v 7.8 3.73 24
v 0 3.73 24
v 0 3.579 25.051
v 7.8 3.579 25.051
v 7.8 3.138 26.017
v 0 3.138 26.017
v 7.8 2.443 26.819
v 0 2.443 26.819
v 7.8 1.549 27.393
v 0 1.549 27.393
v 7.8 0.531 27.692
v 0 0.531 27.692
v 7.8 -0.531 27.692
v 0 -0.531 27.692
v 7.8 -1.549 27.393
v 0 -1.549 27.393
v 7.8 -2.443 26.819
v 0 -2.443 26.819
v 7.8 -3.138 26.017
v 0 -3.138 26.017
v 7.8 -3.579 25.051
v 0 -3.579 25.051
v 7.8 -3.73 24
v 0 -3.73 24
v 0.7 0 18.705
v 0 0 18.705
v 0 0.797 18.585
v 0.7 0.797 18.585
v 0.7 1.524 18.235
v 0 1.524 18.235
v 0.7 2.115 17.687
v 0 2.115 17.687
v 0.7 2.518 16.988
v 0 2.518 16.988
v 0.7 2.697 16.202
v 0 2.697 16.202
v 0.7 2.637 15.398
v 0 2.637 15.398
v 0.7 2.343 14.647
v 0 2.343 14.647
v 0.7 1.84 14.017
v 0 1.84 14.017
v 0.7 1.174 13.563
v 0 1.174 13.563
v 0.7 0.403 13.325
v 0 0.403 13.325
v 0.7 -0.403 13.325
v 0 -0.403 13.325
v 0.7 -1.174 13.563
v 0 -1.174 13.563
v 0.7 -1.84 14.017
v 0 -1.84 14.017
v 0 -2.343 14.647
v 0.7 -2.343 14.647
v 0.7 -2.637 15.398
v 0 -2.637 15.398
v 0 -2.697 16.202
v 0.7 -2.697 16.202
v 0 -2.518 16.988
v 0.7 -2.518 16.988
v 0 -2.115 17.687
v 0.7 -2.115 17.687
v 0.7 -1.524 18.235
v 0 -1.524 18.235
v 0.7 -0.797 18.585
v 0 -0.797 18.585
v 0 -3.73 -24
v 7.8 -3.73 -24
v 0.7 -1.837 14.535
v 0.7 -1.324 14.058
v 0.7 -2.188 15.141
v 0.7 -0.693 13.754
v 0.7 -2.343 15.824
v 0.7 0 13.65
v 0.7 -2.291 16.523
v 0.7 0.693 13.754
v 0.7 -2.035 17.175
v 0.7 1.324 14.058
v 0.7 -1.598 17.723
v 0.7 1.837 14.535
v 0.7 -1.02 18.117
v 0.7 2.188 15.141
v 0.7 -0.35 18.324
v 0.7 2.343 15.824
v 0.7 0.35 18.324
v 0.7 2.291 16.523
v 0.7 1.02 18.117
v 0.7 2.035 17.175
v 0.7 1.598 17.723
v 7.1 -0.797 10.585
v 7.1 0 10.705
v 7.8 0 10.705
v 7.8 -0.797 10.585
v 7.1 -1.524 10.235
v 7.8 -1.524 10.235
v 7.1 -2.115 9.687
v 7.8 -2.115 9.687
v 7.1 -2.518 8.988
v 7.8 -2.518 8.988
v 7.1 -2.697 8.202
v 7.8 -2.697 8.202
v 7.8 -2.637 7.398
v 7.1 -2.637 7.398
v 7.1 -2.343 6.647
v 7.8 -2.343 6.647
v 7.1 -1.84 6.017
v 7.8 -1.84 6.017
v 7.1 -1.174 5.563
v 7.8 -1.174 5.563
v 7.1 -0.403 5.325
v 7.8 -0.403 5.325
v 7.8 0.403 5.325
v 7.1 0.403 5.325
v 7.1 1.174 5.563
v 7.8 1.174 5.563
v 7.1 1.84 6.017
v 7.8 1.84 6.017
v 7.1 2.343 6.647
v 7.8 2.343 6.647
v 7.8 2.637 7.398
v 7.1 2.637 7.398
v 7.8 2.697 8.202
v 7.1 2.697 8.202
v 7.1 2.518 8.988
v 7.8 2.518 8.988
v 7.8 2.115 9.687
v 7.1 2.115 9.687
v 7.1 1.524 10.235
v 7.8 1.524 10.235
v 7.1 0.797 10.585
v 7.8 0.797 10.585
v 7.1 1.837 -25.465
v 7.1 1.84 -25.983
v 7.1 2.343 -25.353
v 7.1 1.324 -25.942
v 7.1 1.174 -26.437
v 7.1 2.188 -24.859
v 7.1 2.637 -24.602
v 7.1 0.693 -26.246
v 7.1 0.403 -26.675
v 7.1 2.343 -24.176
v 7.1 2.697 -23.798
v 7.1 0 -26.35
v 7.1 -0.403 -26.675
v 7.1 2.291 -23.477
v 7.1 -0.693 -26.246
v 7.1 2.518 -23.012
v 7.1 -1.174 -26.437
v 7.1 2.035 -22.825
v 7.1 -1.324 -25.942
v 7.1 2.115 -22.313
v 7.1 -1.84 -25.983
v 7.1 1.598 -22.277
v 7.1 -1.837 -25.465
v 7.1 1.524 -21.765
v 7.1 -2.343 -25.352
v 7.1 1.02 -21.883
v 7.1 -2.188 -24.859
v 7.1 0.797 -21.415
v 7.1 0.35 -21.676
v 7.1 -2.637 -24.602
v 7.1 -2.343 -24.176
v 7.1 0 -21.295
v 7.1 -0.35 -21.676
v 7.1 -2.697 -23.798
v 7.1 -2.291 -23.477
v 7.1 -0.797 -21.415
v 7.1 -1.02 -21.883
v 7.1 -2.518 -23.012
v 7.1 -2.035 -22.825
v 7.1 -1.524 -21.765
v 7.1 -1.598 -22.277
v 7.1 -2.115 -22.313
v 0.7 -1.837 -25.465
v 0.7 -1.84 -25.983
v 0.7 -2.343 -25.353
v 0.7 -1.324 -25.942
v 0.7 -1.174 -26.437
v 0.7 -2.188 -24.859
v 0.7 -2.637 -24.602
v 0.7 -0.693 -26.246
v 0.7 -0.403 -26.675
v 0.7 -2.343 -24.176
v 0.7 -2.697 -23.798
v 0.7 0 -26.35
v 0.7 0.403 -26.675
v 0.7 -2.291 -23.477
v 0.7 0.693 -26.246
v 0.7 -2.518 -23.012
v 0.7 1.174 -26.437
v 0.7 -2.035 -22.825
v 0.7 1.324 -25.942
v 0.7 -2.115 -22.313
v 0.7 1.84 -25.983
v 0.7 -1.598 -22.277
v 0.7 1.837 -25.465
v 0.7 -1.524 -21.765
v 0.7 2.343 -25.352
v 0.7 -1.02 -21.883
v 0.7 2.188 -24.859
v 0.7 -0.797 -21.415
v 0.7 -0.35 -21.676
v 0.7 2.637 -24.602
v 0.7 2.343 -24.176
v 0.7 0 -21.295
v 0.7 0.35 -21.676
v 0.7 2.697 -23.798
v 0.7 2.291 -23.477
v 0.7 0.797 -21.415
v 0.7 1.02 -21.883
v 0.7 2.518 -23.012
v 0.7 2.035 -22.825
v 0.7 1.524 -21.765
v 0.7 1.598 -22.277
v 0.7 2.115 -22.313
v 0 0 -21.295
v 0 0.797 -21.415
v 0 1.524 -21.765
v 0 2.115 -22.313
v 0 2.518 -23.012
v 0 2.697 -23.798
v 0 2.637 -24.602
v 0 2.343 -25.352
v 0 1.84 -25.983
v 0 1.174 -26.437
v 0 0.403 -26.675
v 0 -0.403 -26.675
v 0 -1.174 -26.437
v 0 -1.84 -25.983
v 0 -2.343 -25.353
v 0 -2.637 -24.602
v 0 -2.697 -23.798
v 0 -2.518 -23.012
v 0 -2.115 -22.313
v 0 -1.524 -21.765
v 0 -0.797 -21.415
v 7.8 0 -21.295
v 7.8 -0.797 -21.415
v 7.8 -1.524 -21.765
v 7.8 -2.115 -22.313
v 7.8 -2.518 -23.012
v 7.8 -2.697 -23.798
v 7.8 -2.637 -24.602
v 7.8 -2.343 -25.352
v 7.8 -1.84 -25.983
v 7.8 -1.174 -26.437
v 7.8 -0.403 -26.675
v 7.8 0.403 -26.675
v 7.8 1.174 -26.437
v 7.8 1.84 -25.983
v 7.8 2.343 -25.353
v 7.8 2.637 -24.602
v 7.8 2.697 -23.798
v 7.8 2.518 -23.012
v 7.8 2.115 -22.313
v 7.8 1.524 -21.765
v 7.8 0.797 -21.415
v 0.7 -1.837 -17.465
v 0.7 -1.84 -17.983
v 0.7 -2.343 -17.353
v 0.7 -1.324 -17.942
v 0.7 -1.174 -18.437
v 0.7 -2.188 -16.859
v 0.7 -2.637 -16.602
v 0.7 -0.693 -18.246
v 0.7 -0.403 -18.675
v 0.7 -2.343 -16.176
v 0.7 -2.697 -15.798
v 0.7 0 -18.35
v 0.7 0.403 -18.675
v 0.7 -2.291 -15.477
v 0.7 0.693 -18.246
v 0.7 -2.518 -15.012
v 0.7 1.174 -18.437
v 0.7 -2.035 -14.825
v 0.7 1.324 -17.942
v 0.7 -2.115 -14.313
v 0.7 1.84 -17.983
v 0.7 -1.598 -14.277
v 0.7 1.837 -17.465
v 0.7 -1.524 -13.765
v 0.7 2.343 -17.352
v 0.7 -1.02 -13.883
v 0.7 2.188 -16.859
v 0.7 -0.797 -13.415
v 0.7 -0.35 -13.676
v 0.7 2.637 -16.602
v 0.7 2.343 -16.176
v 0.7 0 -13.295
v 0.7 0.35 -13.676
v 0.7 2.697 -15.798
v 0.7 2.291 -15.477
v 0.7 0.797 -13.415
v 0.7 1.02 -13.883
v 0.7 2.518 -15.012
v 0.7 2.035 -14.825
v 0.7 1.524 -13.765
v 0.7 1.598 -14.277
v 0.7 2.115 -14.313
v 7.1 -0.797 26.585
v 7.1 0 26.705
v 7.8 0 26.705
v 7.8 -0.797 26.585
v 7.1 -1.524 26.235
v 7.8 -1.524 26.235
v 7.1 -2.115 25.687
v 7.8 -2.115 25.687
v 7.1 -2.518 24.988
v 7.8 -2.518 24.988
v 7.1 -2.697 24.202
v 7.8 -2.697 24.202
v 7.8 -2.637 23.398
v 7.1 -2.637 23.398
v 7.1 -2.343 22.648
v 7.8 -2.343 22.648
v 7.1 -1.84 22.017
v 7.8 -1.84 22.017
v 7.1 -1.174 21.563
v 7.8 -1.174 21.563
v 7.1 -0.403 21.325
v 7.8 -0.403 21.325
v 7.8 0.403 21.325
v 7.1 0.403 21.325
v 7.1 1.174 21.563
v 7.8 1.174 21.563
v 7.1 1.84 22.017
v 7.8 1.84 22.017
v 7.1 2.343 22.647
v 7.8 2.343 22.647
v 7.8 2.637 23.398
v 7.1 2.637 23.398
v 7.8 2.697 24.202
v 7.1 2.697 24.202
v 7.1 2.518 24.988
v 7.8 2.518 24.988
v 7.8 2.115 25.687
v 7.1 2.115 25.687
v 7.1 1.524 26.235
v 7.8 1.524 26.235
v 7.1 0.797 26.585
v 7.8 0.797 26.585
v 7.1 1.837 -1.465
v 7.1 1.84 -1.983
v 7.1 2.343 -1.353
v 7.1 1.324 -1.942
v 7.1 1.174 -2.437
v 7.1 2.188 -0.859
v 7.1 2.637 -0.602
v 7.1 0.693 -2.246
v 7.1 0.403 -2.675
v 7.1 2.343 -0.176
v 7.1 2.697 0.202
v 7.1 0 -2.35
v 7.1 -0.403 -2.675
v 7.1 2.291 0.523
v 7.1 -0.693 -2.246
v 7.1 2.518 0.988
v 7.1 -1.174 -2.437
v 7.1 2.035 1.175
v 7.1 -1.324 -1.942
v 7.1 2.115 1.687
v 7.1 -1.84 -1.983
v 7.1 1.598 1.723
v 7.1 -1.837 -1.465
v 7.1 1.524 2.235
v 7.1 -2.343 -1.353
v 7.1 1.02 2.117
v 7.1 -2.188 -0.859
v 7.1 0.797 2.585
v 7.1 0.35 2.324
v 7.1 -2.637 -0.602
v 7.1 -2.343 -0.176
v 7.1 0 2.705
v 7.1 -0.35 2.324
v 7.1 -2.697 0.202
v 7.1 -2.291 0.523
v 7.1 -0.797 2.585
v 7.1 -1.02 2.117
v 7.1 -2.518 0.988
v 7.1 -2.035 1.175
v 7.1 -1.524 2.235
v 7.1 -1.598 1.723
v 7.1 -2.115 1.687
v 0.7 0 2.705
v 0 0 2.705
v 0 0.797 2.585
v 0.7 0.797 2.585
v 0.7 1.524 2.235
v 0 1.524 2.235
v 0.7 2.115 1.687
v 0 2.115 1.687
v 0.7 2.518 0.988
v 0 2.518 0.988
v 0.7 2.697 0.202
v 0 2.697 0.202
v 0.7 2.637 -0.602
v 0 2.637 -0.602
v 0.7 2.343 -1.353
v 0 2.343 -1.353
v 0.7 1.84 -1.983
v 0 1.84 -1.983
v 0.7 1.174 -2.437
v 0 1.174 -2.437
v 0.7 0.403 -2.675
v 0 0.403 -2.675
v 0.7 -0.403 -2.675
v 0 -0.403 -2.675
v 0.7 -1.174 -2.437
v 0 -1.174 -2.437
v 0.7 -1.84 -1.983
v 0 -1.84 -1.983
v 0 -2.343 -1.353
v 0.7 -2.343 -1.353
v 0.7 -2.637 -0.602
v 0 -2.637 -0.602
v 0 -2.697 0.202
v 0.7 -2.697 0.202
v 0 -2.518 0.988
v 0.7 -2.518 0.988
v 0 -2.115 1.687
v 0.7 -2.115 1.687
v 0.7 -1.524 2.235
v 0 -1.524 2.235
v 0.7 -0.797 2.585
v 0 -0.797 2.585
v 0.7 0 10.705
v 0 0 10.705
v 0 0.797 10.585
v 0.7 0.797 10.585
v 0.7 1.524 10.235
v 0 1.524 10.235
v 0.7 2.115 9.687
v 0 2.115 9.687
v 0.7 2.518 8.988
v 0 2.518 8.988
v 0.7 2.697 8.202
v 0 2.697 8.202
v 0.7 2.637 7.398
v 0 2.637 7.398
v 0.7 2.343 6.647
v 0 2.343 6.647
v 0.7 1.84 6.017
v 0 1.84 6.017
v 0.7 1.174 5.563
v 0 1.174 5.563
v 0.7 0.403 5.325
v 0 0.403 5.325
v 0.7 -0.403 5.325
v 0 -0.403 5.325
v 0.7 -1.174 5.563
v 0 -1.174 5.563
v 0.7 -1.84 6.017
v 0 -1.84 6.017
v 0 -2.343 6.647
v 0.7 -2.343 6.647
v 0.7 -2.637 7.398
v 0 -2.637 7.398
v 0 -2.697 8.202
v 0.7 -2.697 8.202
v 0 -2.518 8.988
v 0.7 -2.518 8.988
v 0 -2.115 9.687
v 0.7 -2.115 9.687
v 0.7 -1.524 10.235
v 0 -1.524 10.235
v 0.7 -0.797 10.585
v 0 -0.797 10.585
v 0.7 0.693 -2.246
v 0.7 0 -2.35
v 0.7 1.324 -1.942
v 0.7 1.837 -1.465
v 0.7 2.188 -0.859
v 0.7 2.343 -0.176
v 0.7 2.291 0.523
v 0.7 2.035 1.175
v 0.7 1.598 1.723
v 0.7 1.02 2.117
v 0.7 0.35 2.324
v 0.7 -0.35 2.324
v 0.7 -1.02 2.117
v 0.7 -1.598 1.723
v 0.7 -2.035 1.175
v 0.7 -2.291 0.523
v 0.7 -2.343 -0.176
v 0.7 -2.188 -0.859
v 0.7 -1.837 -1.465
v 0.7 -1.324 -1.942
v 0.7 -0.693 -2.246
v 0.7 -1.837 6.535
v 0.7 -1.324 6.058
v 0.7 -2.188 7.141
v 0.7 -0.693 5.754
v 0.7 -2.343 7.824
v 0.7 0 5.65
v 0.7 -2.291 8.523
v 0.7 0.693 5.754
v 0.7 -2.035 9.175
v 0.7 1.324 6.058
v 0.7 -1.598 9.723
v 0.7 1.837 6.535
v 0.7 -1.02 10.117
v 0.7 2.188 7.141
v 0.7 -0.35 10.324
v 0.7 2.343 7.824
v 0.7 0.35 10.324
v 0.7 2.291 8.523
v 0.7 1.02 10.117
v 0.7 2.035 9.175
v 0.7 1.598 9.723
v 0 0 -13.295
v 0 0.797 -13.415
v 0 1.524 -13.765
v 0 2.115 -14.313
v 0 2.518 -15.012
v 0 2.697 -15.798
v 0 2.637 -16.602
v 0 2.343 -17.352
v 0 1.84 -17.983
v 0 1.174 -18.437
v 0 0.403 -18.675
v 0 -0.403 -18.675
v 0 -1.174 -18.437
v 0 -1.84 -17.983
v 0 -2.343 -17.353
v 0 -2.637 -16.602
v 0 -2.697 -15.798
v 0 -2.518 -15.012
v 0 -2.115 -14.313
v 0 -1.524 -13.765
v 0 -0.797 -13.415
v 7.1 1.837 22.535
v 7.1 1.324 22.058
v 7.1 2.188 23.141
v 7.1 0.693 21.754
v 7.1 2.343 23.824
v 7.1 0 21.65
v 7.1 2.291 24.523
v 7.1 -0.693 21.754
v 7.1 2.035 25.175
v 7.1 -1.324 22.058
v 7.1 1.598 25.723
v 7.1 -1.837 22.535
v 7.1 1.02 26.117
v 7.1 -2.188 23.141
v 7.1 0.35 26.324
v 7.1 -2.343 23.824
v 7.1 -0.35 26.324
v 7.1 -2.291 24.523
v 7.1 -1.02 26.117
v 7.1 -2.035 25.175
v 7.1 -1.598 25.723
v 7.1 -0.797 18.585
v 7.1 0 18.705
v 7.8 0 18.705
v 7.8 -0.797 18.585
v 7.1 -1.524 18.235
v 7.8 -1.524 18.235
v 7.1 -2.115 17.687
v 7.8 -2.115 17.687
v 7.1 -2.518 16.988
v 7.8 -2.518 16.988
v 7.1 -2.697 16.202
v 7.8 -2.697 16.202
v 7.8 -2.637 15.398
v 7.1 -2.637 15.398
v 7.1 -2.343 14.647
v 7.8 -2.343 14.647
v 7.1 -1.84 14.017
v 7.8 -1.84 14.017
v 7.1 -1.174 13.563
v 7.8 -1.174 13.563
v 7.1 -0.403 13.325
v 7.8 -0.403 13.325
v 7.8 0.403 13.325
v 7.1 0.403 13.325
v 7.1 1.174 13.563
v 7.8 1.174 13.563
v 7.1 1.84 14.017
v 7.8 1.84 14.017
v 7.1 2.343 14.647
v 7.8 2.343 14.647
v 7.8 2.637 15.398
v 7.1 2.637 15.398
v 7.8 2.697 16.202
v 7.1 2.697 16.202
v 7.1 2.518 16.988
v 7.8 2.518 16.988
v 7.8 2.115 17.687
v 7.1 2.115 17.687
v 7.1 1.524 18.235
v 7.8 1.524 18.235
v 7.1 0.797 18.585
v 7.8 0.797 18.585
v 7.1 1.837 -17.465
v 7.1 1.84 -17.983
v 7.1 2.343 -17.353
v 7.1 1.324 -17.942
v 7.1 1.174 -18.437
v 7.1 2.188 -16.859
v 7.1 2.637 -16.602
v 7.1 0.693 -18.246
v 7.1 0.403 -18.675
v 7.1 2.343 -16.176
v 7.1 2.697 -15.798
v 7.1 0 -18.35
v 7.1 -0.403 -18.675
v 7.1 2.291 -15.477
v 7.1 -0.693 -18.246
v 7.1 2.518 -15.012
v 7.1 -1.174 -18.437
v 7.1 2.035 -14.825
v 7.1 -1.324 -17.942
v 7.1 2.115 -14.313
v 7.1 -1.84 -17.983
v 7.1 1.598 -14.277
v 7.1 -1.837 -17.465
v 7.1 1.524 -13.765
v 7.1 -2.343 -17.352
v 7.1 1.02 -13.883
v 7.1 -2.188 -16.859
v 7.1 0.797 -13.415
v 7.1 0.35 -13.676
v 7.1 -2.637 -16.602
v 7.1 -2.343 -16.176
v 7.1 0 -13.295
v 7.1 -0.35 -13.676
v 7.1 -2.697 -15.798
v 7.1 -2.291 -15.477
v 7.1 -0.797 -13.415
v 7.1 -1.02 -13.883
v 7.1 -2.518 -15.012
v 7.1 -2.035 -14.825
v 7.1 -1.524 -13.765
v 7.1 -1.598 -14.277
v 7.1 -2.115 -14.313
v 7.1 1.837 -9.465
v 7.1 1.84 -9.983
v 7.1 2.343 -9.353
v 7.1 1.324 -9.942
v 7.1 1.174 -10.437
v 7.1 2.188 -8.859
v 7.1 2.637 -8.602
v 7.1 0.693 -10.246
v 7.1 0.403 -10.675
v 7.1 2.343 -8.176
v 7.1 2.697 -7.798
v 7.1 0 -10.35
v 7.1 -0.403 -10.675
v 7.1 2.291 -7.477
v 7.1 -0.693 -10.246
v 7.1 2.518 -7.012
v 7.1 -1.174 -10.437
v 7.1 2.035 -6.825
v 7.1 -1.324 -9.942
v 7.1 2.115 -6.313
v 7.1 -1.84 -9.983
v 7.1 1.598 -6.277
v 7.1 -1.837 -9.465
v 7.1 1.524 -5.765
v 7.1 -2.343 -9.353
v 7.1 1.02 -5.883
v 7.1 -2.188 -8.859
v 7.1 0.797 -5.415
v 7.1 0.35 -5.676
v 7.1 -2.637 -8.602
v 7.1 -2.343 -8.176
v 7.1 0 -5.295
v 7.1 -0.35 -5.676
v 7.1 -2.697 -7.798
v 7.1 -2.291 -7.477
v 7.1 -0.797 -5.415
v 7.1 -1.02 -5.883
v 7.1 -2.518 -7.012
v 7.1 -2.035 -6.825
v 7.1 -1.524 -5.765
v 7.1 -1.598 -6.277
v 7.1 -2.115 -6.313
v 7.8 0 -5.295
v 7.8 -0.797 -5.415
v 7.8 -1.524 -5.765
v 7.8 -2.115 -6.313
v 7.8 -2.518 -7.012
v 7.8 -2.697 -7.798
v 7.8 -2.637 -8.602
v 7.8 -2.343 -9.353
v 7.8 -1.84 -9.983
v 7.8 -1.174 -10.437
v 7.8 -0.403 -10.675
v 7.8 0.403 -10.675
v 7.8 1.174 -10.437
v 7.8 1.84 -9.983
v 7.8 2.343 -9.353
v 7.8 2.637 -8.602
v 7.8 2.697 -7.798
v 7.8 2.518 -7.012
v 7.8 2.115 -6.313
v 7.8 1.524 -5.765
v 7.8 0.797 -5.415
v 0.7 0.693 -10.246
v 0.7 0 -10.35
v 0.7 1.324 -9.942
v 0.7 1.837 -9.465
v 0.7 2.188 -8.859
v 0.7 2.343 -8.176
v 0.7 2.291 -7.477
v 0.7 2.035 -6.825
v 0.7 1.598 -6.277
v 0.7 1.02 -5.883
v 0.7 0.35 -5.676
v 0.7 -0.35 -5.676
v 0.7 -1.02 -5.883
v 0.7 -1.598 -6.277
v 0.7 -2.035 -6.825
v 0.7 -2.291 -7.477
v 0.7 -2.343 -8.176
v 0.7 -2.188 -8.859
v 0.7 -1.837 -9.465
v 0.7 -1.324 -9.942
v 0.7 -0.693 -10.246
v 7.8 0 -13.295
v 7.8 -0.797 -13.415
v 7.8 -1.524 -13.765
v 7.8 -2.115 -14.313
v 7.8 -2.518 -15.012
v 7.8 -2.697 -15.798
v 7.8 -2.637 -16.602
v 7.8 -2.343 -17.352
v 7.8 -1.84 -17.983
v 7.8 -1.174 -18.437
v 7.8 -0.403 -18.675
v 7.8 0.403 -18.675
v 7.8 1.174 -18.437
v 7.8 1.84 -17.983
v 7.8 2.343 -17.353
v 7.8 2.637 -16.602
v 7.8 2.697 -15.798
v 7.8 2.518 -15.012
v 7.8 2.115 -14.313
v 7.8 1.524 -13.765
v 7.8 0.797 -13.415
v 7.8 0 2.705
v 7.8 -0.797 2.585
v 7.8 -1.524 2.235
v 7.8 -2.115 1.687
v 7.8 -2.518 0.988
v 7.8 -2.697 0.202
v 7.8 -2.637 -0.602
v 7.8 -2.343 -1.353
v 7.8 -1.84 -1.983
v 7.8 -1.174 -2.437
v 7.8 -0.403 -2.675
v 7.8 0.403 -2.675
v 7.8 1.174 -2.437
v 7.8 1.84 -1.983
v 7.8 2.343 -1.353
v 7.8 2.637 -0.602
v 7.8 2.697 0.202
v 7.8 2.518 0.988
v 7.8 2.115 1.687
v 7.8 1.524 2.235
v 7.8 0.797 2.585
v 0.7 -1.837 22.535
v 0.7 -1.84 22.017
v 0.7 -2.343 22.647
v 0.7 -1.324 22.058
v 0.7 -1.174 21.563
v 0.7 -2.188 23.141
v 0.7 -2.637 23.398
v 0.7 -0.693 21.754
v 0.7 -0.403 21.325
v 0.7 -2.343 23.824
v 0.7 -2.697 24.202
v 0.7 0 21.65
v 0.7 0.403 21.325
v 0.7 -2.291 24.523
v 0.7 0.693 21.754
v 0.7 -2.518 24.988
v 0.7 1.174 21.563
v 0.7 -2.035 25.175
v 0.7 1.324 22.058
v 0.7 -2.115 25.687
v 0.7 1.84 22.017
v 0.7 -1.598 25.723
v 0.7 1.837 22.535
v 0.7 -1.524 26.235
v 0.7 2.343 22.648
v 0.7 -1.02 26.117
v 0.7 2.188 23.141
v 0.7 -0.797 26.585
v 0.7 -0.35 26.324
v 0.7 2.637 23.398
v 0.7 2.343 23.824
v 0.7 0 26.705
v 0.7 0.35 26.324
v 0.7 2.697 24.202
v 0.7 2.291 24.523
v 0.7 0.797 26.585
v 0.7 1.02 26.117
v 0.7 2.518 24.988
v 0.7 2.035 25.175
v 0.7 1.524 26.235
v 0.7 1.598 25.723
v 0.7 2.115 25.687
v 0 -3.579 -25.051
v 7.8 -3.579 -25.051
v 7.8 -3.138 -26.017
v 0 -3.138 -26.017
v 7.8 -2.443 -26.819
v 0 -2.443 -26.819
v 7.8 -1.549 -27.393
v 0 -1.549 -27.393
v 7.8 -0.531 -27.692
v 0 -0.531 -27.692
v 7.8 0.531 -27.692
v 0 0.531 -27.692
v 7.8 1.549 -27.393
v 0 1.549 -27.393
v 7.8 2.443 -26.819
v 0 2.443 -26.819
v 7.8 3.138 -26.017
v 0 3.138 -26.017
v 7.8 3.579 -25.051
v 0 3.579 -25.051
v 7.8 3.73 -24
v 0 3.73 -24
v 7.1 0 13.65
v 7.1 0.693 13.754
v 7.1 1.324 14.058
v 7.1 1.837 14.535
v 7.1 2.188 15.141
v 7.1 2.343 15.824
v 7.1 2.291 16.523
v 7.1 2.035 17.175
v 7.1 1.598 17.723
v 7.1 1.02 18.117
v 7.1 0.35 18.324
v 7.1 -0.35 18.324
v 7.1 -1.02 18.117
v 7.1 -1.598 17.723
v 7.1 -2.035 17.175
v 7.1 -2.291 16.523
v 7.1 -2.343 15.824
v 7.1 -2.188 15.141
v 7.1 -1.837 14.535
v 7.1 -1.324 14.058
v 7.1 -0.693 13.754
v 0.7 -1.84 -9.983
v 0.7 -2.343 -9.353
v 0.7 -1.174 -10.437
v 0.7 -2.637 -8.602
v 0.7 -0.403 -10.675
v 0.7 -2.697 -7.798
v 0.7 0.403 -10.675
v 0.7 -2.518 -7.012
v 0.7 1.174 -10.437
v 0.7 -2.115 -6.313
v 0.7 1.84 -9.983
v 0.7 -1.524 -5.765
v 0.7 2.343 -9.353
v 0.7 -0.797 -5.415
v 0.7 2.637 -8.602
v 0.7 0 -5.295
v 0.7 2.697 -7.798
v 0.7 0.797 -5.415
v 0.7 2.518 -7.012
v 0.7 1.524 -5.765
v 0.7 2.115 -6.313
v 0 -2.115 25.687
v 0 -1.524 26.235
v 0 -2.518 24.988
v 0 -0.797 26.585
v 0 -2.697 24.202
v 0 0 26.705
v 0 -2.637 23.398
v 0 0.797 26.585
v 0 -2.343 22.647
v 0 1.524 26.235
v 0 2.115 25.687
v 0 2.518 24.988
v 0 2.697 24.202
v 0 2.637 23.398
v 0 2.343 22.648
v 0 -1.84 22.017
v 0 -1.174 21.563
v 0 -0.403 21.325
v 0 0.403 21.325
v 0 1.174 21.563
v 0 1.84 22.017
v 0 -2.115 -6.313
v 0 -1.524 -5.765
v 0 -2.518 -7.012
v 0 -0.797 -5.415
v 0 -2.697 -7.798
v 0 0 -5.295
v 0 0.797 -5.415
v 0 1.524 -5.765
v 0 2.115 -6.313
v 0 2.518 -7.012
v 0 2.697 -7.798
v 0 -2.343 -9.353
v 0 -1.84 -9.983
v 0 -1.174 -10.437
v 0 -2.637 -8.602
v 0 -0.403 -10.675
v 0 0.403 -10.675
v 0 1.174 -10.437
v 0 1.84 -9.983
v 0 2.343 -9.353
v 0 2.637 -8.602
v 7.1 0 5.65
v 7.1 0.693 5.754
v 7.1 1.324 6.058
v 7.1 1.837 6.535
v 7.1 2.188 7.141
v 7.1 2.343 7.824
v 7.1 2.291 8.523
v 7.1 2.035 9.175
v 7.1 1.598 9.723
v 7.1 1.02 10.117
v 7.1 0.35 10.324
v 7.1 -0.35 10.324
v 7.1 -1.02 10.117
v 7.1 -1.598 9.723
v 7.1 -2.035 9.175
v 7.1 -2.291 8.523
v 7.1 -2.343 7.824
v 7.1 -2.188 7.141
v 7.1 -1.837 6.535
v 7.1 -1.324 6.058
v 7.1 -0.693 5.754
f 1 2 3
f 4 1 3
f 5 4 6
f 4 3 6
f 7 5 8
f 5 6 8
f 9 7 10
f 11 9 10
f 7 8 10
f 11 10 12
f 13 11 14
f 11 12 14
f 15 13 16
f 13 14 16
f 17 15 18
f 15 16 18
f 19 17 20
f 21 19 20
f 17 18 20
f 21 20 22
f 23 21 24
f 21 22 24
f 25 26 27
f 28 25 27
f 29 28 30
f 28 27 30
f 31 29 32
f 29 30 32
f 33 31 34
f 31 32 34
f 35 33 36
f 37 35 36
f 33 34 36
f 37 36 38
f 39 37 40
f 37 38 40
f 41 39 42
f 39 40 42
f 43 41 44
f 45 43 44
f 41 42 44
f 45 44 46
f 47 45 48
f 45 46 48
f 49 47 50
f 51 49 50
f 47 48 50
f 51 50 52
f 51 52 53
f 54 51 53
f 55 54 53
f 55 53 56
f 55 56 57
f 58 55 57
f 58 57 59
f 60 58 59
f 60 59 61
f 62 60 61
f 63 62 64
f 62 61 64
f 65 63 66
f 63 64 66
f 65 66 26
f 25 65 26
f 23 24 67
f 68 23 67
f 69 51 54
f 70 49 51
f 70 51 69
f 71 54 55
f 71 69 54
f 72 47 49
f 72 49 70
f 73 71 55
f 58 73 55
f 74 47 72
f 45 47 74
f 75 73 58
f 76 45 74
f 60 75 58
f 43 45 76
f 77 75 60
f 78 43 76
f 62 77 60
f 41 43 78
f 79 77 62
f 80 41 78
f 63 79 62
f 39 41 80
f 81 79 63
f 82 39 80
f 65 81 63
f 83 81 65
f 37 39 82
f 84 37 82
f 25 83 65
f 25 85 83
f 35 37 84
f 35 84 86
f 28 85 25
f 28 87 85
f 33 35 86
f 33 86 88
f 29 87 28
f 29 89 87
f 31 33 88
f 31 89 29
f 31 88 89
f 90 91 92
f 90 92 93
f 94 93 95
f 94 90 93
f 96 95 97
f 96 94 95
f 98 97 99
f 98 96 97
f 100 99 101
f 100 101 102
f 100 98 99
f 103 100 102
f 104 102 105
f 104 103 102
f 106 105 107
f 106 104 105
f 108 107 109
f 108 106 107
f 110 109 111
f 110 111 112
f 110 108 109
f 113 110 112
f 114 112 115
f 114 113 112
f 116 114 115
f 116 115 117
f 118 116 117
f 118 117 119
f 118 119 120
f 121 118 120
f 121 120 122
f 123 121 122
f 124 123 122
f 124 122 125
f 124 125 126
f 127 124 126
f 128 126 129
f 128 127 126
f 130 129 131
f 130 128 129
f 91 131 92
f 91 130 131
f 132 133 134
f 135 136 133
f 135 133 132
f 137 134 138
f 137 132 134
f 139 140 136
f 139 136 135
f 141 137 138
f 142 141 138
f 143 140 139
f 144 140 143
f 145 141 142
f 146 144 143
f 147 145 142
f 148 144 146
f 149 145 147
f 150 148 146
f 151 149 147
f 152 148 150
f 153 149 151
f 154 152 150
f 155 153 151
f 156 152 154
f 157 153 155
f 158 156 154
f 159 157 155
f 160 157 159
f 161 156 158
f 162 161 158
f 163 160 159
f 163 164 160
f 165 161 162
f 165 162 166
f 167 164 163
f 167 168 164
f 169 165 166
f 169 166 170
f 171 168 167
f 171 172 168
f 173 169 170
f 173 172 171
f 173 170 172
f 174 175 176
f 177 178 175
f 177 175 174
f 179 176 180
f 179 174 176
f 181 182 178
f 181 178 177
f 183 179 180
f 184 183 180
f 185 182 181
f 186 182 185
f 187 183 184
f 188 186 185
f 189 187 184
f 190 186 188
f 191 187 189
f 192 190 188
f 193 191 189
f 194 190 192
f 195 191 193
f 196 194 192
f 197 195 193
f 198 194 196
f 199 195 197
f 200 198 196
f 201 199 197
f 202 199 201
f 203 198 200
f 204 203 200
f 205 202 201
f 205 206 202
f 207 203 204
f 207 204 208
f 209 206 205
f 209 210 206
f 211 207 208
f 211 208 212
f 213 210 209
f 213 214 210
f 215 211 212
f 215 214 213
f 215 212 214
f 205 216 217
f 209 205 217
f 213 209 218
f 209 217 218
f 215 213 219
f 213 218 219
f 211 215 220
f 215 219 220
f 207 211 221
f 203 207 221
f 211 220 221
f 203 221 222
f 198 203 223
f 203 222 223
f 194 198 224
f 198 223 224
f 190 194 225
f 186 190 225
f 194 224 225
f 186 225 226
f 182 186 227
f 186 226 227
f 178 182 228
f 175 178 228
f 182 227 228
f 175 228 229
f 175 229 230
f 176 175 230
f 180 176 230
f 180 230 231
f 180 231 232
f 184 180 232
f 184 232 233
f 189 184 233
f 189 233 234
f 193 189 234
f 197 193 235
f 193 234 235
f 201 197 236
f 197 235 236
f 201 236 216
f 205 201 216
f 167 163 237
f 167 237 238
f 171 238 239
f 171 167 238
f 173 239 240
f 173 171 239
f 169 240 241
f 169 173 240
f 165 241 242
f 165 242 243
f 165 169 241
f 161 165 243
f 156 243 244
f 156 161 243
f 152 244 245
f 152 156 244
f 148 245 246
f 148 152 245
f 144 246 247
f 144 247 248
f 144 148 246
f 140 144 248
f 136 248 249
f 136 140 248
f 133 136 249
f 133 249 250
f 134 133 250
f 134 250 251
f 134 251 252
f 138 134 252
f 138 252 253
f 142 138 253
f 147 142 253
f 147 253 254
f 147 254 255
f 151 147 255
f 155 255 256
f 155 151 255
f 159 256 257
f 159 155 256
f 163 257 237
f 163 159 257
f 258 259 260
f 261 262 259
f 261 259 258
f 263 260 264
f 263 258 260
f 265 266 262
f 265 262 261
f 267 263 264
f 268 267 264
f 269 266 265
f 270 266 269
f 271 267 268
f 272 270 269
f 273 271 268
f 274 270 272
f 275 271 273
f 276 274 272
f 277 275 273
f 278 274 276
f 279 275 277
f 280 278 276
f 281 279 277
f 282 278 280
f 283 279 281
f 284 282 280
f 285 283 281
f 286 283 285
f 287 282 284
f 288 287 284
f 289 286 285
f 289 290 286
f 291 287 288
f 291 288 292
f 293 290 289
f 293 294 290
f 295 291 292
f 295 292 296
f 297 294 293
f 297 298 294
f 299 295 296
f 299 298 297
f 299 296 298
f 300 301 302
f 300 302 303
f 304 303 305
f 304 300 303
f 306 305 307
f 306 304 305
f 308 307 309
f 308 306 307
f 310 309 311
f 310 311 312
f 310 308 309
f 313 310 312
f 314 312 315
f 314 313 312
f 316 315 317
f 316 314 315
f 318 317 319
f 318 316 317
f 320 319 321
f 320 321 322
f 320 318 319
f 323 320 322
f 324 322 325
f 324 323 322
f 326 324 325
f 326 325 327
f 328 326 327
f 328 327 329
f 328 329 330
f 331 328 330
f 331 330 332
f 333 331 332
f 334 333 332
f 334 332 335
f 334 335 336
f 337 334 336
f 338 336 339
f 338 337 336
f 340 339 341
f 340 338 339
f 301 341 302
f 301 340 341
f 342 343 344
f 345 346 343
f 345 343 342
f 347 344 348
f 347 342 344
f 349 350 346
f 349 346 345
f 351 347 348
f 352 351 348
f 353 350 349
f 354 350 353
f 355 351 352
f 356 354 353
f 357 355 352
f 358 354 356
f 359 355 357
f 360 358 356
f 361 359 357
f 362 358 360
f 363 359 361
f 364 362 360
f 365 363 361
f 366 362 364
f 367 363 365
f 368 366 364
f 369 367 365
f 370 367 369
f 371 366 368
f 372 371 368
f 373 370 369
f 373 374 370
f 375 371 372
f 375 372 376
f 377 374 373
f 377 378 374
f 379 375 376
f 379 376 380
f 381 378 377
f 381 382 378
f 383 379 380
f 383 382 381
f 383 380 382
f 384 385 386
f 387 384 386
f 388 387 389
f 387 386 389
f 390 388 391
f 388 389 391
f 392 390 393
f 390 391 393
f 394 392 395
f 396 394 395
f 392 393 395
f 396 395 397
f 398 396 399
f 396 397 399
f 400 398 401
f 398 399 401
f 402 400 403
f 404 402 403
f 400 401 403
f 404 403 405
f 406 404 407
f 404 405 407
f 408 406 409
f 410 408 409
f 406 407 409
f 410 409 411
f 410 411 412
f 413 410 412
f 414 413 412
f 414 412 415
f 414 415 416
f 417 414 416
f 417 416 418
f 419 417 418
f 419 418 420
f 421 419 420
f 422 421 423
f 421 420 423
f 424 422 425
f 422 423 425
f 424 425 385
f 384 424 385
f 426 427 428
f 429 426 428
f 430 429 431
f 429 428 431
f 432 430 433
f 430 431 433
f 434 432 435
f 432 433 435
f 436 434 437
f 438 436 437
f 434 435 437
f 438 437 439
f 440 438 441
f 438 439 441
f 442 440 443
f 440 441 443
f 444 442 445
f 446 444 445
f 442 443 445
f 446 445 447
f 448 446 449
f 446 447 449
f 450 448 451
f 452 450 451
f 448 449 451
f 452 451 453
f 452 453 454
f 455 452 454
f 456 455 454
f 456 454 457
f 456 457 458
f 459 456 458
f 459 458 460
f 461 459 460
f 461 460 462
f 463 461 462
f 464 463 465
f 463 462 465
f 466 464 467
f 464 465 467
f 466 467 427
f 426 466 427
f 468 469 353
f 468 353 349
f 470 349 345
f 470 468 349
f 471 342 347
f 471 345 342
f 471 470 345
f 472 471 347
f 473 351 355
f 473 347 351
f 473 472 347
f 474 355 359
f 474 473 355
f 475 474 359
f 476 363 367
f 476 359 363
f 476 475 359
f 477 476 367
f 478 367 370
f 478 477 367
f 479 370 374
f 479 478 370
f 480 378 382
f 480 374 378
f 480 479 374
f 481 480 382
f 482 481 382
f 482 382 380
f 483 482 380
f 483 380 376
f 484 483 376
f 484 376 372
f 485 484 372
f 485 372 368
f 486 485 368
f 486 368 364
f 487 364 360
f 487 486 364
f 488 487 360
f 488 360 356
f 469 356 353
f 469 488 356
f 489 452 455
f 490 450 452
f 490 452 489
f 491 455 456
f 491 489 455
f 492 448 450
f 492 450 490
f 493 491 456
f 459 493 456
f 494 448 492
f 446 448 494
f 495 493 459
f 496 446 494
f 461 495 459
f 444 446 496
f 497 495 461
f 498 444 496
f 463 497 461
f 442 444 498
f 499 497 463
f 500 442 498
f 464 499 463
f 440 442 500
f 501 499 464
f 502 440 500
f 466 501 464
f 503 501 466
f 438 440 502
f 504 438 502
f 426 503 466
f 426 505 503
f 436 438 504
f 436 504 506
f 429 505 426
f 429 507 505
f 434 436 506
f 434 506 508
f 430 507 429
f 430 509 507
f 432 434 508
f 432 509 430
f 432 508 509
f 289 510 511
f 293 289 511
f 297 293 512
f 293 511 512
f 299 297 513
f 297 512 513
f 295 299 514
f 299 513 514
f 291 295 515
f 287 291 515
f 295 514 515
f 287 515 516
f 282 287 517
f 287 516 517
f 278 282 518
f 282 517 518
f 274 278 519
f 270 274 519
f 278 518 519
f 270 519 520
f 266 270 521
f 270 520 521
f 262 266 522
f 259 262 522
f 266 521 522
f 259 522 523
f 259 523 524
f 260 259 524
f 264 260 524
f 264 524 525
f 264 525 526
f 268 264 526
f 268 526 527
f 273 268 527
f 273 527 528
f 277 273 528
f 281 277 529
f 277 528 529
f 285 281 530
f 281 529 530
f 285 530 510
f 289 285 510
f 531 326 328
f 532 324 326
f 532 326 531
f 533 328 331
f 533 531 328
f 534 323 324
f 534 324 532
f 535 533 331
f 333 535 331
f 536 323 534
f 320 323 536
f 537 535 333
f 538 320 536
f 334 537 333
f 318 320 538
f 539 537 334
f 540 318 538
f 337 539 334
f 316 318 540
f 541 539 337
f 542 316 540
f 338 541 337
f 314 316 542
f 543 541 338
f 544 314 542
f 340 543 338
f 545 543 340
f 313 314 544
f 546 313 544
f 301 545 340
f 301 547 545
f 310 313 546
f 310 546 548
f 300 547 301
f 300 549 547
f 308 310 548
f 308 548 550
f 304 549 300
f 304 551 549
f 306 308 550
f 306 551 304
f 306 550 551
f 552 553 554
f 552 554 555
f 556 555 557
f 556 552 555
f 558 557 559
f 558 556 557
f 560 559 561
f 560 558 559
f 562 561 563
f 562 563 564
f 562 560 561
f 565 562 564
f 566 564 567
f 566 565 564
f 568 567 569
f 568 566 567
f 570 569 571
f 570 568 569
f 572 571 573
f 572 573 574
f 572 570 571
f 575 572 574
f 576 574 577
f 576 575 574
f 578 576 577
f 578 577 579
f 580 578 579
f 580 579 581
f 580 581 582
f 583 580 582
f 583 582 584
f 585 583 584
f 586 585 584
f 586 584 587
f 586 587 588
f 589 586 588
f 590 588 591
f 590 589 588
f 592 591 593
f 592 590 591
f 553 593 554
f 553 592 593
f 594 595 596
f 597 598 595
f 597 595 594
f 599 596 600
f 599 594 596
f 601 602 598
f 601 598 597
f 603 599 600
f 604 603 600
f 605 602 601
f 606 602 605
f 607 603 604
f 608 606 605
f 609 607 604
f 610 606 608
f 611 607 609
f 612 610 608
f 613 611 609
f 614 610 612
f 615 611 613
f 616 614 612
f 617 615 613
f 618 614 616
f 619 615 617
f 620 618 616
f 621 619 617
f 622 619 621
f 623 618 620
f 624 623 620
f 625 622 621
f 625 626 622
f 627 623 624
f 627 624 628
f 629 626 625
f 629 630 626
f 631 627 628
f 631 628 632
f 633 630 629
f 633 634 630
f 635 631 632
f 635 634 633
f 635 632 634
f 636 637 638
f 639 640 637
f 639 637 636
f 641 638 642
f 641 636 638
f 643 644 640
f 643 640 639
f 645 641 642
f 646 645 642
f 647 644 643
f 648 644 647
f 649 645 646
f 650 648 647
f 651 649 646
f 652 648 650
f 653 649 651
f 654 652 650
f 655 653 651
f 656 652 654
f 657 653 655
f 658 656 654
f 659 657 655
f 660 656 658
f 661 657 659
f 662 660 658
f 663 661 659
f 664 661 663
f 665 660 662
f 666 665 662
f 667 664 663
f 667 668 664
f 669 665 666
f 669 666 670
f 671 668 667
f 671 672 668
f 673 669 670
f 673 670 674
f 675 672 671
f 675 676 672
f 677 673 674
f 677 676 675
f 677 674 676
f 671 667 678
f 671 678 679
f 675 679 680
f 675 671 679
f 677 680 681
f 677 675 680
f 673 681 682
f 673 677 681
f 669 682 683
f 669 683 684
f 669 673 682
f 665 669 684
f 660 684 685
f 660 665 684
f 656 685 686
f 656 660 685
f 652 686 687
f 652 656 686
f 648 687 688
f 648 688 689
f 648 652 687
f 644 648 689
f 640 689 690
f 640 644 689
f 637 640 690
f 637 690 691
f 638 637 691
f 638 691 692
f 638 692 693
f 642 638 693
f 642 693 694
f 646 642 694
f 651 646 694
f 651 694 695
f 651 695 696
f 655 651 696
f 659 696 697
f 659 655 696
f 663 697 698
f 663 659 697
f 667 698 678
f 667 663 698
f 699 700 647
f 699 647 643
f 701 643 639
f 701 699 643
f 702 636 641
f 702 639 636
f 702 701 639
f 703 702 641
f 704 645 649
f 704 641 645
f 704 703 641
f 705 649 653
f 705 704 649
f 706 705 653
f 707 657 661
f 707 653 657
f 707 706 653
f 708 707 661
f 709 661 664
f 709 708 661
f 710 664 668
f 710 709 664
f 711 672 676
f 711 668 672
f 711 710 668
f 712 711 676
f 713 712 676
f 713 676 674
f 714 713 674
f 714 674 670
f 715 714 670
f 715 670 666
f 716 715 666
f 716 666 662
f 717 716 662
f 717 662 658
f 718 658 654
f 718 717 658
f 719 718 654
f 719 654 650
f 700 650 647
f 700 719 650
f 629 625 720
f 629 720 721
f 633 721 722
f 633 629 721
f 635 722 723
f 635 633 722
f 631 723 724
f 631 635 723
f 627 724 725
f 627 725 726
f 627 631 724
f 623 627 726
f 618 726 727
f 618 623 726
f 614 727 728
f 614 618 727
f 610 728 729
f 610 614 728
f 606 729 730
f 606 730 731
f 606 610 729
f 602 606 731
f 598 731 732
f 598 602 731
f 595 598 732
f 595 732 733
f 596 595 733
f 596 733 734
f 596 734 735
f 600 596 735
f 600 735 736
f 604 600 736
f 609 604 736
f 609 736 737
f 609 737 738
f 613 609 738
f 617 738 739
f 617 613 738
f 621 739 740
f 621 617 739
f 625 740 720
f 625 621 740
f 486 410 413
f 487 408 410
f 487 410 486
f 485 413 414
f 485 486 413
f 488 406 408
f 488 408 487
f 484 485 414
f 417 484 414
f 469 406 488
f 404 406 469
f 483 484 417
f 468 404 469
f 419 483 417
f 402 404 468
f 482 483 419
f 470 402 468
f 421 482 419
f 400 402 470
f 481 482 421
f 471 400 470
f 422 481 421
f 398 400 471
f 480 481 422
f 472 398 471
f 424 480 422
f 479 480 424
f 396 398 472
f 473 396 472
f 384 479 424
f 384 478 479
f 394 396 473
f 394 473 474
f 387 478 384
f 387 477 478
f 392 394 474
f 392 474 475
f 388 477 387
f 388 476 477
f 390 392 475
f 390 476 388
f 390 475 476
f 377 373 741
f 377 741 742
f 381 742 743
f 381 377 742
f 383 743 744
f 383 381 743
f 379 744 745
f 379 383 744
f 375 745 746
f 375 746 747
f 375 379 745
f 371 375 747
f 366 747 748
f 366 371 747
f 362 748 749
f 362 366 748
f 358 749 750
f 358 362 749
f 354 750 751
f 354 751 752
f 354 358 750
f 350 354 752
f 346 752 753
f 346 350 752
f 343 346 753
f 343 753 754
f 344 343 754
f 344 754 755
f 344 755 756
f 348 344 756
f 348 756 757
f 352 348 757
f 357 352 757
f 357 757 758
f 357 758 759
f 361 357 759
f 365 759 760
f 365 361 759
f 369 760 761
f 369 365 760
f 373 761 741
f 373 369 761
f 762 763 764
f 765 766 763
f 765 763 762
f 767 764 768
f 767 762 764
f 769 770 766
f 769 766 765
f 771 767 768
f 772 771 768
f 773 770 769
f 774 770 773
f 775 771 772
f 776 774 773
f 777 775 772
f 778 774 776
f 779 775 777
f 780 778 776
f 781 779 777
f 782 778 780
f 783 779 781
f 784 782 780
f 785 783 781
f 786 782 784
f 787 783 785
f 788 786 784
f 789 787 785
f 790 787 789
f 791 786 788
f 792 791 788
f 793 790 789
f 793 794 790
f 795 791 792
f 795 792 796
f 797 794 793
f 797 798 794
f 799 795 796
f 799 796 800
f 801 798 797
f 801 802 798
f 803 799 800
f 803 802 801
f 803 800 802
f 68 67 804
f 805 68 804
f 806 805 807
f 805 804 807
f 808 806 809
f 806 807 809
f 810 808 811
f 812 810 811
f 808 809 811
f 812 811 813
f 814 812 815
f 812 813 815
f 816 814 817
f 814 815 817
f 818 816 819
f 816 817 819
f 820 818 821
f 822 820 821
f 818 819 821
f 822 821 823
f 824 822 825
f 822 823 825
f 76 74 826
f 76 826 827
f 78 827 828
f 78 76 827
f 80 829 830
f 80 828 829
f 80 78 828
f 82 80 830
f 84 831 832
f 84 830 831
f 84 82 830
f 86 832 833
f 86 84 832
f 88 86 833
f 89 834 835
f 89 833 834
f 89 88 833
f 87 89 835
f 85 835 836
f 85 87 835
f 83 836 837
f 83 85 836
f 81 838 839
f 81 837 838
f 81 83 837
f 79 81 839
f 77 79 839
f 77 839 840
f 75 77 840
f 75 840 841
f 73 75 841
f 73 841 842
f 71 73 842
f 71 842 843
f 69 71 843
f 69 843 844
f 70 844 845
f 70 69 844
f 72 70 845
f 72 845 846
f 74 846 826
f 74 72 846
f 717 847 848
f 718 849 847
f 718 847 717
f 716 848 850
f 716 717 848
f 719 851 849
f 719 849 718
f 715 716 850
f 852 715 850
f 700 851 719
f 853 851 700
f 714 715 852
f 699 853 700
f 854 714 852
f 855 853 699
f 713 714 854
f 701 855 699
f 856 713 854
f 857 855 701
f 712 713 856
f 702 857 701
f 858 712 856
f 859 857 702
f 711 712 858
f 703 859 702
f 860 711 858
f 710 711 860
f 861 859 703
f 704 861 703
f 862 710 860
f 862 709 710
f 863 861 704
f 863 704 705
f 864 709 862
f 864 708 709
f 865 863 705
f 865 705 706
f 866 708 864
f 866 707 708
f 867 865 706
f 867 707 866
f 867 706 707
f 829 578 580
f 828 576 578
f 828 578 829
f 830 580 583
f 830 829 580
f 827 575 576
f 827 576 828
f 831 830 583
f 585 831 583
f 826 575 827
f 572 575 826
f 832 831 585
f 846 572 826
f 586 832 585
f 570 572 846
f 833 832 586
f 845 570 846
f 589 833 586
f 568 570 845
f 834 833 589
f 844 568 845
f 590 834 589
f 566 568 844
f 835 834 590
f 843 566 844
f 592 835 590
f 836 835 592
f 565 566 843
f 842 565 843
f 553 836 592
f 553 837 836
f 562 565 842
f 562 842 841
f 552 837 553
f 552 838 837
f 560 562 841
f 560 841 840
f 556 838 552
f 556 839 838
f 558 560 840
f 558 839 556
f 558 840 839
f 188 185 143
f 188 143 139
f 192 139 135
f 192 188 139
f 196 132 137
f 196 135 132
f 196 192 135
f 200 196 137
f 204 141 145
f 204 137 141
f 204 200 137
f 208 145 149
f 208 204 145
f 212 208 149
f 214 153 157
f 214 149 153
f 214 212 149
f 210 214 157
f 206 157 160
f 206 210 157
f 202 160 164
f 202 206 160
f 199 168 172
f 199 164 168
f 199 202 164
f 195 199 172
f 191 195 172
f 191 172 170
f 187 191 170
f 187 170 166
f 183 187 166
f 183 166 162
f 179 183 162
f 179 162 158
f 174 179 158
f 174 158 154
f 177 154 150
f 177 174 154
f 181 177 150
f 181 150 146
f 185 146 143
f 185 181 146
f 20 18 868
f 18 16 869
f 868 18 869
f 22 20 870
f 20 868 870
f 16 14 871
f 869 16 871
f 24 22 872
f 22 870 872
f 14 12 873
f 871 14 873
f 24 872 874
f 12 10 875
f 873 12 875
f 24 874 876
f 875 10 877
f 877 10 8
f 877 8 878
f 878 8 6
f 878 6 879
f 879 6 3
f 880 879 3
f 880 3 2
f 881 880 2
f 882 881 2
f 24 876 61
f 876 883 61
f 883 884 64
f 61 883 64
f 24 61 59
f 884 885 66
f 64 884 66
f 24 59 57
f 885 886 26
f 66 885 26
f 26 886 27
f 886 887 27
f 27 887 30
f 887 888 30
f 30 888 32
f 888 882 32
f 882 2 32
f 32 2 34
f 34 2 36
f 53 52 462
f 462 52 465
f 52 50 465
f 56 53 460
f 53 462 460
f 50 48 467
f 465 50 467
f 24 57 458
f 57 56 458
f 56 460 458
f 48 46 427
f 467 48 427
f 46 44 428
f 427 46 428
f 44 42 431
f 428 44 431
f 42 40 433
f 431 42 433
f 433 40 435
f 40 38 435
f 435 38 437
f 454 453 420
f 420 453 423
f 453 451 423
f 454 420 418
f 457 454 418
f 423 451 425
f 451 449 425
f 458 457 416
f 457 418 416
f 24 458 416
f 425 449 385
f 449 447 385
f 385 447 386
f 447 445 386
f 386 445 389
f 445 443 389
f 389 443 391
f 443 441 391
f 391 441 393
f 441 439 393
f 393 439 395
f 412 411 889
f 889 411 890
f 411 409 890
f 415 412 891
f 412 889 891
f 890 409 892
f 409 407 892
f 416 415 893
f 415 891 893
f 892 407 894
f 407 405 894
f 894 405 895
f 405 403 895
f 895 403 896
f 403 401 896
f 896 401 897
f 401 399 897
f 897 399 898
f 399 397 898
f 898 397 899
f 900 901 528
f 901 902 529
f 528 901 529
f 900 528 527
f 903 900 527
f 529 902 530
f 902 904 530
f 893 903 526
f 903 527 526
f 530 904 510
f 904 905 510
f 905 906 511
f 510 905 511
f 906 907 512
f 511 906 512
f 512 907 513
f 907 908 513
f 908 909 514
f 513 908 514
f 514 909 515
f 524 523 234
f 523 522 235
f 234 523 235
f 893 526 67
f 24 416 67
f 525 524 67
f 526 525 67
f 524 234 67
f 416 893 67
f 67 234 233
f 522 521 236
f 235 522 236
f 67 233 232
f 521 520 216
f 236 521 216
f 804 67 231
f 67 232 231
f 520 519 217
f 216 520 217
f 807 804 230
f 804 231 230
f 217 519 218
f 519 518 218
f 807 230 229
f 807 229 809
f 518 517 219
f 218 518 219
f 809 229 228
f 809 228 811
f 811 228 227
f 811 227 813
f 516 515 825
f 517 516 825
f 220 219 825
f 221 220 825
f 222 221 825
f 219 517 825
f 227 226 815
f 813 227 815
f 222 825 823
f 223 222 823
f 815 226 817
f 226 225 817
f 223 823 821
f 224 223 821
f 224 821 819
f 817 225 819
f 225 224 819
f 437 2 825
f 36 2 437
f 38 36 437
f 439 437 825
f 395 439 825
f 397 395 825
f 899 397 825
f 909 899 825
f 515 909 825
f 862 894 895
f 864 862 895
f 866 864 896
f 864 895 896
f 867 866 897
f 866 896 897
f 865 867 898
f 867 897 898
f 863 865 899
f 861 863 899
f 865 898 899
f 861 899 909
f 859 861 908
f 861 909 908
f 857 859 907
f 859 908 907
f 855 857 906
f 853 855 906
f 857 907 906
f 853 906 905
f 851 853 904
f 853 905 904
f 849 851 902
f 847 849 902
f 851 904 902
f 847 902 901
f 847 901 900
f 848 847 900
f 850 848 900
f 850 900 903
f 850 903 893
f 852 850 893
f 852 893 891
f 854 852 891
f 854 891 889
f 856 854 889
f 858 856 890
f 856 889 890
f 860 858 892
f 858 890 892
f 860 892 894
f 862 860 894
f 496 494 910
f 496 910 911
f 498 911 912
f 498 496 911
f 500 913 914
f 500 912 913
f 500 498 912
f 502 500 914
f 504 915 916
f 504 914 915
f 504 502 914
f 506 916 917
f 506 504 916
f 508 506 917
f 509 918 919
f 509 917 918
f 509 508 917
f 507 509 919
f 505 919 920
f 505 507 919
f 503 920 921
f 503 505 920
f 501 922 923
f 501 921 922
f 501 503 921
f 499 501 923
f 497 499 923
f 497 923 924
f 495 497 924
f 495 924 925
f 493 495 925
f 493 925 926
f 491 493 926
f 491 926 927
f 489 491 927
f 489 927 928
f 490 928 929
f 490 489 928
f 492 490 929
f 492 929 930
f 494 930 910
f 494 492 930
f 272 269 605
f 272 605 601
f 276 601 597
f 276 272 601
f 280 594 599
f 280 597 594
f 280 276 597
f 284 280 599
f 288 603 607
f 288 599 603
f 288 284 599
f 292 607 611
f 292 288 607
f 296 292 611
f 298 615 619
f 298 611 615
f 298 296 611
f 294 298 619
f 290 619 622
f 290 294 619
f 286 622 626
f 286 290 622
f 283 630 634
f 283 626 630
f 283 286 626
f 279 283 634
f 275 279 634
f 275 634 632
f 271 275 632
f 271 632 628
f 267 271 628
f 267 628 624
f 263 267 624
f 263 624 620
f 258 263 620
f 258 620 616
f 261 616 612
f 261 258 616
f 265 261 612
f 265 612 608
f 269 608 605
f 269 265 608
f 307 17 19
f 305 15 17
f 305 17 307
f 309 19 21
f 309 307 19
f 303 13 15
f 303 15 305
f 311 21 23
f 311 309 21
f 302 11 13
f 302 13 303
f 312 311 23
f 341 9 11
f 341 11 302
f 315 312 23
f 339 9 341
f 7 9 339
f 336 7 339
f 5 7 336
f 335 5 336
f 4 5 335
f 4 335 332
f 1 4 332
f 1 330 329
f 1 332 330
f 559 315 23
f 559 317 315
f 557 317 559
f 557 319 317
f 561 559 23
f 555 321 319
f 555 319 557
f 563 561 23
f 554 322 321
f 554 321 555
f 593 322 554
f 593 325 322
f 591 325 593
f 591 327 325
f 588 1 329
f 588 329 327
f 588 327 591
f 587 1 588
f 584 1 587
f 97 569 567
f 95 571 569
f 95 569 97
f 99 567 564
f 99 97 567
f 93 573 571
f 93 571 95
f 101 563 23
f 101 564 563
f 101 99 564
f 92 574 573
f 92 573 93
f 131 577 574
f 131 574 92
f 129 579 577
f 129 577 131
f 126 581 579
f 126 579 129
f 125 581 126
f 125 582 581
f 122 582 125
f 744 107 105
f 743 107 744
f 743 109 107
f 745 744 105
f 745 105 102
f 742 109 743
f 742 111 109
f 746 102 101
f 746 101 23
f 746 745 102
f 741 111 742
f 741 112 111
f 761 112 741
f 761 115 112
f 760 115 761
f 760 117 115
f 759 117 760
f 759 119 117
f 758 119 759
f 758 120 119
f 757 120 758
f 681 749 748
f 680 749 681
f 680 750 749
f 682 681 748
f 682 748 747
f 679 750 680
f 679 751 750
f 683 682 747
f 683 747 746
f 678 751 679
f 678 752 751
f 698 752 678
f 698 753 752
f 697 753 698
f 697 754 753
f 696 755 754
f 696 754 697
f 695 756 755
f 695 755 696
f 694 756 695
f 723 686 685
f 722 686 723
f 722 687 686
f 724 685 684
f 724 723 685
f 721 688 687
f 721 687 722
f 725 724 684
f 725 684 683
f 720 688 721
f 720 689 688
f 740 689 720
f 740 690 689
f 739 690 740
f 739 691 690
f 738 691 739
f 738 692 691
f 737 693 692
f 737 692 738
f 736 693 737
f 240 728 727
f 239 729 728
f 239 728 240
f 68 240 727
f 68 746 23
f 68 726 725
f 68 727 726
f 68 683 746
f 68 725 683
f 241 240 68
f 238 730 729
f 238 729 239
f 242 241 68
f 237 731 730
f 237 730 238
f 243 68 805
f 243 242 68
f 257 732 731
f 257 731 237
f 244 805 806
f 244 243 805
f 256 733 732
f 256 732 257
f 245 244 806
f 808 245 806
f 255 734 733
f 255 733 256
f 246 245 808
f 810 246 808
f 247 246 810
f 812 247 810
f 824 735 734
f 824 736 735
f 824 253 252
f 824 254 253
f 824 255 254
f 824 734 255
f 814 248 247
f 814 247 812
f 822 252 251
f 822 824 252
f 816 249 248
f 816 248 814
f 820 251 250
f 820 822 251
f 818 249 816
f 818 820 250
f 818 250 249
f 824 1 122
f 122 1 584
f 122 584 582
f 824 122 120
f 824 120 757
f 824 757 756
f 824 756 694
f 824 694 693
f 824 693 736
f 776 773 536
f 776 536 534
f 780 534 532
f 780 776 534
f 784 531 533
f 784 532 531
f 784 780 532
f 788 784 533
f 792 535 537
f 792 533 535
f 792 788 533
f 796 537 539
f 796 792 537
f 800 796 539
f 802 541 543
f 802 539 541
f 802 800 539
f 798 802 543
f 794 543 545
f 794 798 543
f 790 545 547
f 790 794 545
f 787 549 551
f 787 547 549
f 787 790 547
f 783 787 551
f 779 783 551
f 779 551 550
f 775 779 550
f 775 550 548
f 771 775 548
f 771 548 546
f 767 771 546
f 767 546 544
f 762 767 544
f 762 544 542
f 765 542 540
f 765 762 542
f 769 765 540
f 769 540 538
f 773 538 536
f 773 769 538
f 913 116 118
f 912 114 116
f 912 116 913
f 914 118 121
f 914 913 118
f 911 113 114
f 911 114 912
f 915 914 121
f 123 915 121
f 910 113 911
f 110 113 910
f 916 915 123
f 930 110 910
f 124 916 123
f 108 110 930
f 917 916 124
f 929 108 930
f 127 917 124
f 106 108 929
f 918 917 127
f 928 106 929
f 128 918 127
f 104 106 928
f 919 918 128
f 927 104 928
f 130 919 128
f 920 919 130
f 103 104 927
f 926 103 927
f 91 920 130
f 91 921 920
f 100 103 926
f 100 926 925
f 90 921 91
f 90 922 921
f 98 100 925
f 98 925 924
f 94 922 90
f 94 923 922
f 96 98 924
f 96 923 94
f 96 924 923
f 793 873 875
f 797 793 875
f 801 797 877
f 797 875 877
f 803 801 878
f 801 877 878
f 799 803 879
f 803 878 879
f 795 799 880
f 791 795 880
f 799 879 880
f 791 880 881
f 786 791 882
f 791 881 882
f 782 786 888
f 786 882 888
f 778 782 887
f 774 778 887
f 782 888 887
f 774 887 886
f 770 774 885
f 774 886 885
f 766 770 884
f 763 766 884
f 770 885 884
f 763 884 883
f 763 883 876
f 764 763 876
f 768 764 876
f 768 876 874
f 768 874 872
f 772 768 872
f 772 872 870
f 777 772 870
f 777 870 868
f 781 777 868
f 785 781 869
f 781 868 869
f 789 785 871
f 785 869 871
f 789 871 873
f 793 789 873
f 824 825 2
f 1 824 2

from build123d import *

# Parameters (mm, degrees)
SKETCH1_R           = 2.35
BOSS_EXTRUDE1_DEPTH = 7.8
SKETCH2_R           = 2.705
CUT_EXTRUDE2_DEPTH  = 0.7
CUT_EXTRUDE3_START  = -0.7
SKETCH3_R           = 2.705
CUT_EXTRUDE3_DEPTH  = 0.7


with BuildPart() as part:
    # Sketch1 → Boss-Extrude1 (new body)
    with BuildSketch(Plane(origin=(0, 0, 0), x_dir=(0, 0, -1), z_dir=(1, 0, 0))):
        with BuildLine():
            Line((-24, -3.73), (24, -3.73))
            ThreePointArc((24, -3.73), (27.73, 0), (24, 3.73))
            Line((24, 3.73), (-24, 3.73))
            ThreePointArc((-24, 3.73), (-27.73, 0), (-24, -3.73))
        make_face()
        with Locations((-24, 0)):
            Circle(SKETCH1_R, mode=Mode.SUBTRACT)
        with Locations((-16, 0)):
            Circle(SKETCH1_R, mode=Mode.SUBTRACT)
        with Locations((-8, 0)):
            Circle(SKETCH1_R, mode=Mode.SUBTRACT)
        Circle(SKETCH1_R, mode=Mode.SUBTRACT)
        with Locations((8, 0)):
            Circle(SKETCH1_R, mode=Mode.SUBTRACT)
        with Locations((16, 0)):
            Circle(SKETCH1_R, mode=Mode.SUBTRACT)
        with Locations((24, 0)):
            Circle(SKETCH1_R, mode=Mode.SUBTRACT)
    extrude(amount=BOSS_EXTRUDE1_DEPTH)

    # Sketch2 → Cut-Extrude2 (cut)
    with BuildSketch(Plane.ZY):
        with Locations((-24, 0)):
            Circle(SKETCH2_R)
        with Locations((-16, 0)):
            Circle(SKETCH2_R)
        with Locations((-8, 0)):
            Circle(SKETCH2_R)
        Circle(SKETCH2_R)
        with Locations((8, 0)):
            Circle(SKETCH2_R)
        with Locations((16, 0)):
            Circle(SKETCH2_R)
        with Locations((24, 0)):
            Circle(SKETCH2_R)
    extrude(amount=-CUT_EXTRUDE2_DEPTH, mode=Mode.SUBTRACT)

    # Sketch3 → Cut-Extrude3 (cut)
    with BuildSketch(Plane(origin=(7.8, 0, 0), x_dir=(0, 0, -1), z_dir=(1, 0, 0)).offset(CUT_EXTRUDE3_START)):
        with Locations(Location((-24, 0, 0), (0, 0, 180))):
            Circle(SKETCH3_R)
        with Locations(Location((-16, 0, 0), (0, 0, 180))):
            Circle(SKETCH3_R)
        with Locations(Location((-8, 0, 0), (0, 0, 180))):
            Circle(SKETCH3_R)
        with Locations(Location((0, 0, 0), (0, 0, 180))):
            Circle(SKETCH3_R)
        with Locations(Location((8, 0, 0), (0, 0, 180))):
            Circle(SKETCH3_R)
        with Locations(Location((16, 0, 0), (0, 0, 180))):
            Circle(SKETCH3_R)
        with Locations(Location((24, 0, 0), (0, 0, 180))):
            Circle(SKETCH3_R)
    extrude(amount=CUT_EXTRUDE3_DEPTH, mode=Mode.SUBTRACT)


solid = part.part
